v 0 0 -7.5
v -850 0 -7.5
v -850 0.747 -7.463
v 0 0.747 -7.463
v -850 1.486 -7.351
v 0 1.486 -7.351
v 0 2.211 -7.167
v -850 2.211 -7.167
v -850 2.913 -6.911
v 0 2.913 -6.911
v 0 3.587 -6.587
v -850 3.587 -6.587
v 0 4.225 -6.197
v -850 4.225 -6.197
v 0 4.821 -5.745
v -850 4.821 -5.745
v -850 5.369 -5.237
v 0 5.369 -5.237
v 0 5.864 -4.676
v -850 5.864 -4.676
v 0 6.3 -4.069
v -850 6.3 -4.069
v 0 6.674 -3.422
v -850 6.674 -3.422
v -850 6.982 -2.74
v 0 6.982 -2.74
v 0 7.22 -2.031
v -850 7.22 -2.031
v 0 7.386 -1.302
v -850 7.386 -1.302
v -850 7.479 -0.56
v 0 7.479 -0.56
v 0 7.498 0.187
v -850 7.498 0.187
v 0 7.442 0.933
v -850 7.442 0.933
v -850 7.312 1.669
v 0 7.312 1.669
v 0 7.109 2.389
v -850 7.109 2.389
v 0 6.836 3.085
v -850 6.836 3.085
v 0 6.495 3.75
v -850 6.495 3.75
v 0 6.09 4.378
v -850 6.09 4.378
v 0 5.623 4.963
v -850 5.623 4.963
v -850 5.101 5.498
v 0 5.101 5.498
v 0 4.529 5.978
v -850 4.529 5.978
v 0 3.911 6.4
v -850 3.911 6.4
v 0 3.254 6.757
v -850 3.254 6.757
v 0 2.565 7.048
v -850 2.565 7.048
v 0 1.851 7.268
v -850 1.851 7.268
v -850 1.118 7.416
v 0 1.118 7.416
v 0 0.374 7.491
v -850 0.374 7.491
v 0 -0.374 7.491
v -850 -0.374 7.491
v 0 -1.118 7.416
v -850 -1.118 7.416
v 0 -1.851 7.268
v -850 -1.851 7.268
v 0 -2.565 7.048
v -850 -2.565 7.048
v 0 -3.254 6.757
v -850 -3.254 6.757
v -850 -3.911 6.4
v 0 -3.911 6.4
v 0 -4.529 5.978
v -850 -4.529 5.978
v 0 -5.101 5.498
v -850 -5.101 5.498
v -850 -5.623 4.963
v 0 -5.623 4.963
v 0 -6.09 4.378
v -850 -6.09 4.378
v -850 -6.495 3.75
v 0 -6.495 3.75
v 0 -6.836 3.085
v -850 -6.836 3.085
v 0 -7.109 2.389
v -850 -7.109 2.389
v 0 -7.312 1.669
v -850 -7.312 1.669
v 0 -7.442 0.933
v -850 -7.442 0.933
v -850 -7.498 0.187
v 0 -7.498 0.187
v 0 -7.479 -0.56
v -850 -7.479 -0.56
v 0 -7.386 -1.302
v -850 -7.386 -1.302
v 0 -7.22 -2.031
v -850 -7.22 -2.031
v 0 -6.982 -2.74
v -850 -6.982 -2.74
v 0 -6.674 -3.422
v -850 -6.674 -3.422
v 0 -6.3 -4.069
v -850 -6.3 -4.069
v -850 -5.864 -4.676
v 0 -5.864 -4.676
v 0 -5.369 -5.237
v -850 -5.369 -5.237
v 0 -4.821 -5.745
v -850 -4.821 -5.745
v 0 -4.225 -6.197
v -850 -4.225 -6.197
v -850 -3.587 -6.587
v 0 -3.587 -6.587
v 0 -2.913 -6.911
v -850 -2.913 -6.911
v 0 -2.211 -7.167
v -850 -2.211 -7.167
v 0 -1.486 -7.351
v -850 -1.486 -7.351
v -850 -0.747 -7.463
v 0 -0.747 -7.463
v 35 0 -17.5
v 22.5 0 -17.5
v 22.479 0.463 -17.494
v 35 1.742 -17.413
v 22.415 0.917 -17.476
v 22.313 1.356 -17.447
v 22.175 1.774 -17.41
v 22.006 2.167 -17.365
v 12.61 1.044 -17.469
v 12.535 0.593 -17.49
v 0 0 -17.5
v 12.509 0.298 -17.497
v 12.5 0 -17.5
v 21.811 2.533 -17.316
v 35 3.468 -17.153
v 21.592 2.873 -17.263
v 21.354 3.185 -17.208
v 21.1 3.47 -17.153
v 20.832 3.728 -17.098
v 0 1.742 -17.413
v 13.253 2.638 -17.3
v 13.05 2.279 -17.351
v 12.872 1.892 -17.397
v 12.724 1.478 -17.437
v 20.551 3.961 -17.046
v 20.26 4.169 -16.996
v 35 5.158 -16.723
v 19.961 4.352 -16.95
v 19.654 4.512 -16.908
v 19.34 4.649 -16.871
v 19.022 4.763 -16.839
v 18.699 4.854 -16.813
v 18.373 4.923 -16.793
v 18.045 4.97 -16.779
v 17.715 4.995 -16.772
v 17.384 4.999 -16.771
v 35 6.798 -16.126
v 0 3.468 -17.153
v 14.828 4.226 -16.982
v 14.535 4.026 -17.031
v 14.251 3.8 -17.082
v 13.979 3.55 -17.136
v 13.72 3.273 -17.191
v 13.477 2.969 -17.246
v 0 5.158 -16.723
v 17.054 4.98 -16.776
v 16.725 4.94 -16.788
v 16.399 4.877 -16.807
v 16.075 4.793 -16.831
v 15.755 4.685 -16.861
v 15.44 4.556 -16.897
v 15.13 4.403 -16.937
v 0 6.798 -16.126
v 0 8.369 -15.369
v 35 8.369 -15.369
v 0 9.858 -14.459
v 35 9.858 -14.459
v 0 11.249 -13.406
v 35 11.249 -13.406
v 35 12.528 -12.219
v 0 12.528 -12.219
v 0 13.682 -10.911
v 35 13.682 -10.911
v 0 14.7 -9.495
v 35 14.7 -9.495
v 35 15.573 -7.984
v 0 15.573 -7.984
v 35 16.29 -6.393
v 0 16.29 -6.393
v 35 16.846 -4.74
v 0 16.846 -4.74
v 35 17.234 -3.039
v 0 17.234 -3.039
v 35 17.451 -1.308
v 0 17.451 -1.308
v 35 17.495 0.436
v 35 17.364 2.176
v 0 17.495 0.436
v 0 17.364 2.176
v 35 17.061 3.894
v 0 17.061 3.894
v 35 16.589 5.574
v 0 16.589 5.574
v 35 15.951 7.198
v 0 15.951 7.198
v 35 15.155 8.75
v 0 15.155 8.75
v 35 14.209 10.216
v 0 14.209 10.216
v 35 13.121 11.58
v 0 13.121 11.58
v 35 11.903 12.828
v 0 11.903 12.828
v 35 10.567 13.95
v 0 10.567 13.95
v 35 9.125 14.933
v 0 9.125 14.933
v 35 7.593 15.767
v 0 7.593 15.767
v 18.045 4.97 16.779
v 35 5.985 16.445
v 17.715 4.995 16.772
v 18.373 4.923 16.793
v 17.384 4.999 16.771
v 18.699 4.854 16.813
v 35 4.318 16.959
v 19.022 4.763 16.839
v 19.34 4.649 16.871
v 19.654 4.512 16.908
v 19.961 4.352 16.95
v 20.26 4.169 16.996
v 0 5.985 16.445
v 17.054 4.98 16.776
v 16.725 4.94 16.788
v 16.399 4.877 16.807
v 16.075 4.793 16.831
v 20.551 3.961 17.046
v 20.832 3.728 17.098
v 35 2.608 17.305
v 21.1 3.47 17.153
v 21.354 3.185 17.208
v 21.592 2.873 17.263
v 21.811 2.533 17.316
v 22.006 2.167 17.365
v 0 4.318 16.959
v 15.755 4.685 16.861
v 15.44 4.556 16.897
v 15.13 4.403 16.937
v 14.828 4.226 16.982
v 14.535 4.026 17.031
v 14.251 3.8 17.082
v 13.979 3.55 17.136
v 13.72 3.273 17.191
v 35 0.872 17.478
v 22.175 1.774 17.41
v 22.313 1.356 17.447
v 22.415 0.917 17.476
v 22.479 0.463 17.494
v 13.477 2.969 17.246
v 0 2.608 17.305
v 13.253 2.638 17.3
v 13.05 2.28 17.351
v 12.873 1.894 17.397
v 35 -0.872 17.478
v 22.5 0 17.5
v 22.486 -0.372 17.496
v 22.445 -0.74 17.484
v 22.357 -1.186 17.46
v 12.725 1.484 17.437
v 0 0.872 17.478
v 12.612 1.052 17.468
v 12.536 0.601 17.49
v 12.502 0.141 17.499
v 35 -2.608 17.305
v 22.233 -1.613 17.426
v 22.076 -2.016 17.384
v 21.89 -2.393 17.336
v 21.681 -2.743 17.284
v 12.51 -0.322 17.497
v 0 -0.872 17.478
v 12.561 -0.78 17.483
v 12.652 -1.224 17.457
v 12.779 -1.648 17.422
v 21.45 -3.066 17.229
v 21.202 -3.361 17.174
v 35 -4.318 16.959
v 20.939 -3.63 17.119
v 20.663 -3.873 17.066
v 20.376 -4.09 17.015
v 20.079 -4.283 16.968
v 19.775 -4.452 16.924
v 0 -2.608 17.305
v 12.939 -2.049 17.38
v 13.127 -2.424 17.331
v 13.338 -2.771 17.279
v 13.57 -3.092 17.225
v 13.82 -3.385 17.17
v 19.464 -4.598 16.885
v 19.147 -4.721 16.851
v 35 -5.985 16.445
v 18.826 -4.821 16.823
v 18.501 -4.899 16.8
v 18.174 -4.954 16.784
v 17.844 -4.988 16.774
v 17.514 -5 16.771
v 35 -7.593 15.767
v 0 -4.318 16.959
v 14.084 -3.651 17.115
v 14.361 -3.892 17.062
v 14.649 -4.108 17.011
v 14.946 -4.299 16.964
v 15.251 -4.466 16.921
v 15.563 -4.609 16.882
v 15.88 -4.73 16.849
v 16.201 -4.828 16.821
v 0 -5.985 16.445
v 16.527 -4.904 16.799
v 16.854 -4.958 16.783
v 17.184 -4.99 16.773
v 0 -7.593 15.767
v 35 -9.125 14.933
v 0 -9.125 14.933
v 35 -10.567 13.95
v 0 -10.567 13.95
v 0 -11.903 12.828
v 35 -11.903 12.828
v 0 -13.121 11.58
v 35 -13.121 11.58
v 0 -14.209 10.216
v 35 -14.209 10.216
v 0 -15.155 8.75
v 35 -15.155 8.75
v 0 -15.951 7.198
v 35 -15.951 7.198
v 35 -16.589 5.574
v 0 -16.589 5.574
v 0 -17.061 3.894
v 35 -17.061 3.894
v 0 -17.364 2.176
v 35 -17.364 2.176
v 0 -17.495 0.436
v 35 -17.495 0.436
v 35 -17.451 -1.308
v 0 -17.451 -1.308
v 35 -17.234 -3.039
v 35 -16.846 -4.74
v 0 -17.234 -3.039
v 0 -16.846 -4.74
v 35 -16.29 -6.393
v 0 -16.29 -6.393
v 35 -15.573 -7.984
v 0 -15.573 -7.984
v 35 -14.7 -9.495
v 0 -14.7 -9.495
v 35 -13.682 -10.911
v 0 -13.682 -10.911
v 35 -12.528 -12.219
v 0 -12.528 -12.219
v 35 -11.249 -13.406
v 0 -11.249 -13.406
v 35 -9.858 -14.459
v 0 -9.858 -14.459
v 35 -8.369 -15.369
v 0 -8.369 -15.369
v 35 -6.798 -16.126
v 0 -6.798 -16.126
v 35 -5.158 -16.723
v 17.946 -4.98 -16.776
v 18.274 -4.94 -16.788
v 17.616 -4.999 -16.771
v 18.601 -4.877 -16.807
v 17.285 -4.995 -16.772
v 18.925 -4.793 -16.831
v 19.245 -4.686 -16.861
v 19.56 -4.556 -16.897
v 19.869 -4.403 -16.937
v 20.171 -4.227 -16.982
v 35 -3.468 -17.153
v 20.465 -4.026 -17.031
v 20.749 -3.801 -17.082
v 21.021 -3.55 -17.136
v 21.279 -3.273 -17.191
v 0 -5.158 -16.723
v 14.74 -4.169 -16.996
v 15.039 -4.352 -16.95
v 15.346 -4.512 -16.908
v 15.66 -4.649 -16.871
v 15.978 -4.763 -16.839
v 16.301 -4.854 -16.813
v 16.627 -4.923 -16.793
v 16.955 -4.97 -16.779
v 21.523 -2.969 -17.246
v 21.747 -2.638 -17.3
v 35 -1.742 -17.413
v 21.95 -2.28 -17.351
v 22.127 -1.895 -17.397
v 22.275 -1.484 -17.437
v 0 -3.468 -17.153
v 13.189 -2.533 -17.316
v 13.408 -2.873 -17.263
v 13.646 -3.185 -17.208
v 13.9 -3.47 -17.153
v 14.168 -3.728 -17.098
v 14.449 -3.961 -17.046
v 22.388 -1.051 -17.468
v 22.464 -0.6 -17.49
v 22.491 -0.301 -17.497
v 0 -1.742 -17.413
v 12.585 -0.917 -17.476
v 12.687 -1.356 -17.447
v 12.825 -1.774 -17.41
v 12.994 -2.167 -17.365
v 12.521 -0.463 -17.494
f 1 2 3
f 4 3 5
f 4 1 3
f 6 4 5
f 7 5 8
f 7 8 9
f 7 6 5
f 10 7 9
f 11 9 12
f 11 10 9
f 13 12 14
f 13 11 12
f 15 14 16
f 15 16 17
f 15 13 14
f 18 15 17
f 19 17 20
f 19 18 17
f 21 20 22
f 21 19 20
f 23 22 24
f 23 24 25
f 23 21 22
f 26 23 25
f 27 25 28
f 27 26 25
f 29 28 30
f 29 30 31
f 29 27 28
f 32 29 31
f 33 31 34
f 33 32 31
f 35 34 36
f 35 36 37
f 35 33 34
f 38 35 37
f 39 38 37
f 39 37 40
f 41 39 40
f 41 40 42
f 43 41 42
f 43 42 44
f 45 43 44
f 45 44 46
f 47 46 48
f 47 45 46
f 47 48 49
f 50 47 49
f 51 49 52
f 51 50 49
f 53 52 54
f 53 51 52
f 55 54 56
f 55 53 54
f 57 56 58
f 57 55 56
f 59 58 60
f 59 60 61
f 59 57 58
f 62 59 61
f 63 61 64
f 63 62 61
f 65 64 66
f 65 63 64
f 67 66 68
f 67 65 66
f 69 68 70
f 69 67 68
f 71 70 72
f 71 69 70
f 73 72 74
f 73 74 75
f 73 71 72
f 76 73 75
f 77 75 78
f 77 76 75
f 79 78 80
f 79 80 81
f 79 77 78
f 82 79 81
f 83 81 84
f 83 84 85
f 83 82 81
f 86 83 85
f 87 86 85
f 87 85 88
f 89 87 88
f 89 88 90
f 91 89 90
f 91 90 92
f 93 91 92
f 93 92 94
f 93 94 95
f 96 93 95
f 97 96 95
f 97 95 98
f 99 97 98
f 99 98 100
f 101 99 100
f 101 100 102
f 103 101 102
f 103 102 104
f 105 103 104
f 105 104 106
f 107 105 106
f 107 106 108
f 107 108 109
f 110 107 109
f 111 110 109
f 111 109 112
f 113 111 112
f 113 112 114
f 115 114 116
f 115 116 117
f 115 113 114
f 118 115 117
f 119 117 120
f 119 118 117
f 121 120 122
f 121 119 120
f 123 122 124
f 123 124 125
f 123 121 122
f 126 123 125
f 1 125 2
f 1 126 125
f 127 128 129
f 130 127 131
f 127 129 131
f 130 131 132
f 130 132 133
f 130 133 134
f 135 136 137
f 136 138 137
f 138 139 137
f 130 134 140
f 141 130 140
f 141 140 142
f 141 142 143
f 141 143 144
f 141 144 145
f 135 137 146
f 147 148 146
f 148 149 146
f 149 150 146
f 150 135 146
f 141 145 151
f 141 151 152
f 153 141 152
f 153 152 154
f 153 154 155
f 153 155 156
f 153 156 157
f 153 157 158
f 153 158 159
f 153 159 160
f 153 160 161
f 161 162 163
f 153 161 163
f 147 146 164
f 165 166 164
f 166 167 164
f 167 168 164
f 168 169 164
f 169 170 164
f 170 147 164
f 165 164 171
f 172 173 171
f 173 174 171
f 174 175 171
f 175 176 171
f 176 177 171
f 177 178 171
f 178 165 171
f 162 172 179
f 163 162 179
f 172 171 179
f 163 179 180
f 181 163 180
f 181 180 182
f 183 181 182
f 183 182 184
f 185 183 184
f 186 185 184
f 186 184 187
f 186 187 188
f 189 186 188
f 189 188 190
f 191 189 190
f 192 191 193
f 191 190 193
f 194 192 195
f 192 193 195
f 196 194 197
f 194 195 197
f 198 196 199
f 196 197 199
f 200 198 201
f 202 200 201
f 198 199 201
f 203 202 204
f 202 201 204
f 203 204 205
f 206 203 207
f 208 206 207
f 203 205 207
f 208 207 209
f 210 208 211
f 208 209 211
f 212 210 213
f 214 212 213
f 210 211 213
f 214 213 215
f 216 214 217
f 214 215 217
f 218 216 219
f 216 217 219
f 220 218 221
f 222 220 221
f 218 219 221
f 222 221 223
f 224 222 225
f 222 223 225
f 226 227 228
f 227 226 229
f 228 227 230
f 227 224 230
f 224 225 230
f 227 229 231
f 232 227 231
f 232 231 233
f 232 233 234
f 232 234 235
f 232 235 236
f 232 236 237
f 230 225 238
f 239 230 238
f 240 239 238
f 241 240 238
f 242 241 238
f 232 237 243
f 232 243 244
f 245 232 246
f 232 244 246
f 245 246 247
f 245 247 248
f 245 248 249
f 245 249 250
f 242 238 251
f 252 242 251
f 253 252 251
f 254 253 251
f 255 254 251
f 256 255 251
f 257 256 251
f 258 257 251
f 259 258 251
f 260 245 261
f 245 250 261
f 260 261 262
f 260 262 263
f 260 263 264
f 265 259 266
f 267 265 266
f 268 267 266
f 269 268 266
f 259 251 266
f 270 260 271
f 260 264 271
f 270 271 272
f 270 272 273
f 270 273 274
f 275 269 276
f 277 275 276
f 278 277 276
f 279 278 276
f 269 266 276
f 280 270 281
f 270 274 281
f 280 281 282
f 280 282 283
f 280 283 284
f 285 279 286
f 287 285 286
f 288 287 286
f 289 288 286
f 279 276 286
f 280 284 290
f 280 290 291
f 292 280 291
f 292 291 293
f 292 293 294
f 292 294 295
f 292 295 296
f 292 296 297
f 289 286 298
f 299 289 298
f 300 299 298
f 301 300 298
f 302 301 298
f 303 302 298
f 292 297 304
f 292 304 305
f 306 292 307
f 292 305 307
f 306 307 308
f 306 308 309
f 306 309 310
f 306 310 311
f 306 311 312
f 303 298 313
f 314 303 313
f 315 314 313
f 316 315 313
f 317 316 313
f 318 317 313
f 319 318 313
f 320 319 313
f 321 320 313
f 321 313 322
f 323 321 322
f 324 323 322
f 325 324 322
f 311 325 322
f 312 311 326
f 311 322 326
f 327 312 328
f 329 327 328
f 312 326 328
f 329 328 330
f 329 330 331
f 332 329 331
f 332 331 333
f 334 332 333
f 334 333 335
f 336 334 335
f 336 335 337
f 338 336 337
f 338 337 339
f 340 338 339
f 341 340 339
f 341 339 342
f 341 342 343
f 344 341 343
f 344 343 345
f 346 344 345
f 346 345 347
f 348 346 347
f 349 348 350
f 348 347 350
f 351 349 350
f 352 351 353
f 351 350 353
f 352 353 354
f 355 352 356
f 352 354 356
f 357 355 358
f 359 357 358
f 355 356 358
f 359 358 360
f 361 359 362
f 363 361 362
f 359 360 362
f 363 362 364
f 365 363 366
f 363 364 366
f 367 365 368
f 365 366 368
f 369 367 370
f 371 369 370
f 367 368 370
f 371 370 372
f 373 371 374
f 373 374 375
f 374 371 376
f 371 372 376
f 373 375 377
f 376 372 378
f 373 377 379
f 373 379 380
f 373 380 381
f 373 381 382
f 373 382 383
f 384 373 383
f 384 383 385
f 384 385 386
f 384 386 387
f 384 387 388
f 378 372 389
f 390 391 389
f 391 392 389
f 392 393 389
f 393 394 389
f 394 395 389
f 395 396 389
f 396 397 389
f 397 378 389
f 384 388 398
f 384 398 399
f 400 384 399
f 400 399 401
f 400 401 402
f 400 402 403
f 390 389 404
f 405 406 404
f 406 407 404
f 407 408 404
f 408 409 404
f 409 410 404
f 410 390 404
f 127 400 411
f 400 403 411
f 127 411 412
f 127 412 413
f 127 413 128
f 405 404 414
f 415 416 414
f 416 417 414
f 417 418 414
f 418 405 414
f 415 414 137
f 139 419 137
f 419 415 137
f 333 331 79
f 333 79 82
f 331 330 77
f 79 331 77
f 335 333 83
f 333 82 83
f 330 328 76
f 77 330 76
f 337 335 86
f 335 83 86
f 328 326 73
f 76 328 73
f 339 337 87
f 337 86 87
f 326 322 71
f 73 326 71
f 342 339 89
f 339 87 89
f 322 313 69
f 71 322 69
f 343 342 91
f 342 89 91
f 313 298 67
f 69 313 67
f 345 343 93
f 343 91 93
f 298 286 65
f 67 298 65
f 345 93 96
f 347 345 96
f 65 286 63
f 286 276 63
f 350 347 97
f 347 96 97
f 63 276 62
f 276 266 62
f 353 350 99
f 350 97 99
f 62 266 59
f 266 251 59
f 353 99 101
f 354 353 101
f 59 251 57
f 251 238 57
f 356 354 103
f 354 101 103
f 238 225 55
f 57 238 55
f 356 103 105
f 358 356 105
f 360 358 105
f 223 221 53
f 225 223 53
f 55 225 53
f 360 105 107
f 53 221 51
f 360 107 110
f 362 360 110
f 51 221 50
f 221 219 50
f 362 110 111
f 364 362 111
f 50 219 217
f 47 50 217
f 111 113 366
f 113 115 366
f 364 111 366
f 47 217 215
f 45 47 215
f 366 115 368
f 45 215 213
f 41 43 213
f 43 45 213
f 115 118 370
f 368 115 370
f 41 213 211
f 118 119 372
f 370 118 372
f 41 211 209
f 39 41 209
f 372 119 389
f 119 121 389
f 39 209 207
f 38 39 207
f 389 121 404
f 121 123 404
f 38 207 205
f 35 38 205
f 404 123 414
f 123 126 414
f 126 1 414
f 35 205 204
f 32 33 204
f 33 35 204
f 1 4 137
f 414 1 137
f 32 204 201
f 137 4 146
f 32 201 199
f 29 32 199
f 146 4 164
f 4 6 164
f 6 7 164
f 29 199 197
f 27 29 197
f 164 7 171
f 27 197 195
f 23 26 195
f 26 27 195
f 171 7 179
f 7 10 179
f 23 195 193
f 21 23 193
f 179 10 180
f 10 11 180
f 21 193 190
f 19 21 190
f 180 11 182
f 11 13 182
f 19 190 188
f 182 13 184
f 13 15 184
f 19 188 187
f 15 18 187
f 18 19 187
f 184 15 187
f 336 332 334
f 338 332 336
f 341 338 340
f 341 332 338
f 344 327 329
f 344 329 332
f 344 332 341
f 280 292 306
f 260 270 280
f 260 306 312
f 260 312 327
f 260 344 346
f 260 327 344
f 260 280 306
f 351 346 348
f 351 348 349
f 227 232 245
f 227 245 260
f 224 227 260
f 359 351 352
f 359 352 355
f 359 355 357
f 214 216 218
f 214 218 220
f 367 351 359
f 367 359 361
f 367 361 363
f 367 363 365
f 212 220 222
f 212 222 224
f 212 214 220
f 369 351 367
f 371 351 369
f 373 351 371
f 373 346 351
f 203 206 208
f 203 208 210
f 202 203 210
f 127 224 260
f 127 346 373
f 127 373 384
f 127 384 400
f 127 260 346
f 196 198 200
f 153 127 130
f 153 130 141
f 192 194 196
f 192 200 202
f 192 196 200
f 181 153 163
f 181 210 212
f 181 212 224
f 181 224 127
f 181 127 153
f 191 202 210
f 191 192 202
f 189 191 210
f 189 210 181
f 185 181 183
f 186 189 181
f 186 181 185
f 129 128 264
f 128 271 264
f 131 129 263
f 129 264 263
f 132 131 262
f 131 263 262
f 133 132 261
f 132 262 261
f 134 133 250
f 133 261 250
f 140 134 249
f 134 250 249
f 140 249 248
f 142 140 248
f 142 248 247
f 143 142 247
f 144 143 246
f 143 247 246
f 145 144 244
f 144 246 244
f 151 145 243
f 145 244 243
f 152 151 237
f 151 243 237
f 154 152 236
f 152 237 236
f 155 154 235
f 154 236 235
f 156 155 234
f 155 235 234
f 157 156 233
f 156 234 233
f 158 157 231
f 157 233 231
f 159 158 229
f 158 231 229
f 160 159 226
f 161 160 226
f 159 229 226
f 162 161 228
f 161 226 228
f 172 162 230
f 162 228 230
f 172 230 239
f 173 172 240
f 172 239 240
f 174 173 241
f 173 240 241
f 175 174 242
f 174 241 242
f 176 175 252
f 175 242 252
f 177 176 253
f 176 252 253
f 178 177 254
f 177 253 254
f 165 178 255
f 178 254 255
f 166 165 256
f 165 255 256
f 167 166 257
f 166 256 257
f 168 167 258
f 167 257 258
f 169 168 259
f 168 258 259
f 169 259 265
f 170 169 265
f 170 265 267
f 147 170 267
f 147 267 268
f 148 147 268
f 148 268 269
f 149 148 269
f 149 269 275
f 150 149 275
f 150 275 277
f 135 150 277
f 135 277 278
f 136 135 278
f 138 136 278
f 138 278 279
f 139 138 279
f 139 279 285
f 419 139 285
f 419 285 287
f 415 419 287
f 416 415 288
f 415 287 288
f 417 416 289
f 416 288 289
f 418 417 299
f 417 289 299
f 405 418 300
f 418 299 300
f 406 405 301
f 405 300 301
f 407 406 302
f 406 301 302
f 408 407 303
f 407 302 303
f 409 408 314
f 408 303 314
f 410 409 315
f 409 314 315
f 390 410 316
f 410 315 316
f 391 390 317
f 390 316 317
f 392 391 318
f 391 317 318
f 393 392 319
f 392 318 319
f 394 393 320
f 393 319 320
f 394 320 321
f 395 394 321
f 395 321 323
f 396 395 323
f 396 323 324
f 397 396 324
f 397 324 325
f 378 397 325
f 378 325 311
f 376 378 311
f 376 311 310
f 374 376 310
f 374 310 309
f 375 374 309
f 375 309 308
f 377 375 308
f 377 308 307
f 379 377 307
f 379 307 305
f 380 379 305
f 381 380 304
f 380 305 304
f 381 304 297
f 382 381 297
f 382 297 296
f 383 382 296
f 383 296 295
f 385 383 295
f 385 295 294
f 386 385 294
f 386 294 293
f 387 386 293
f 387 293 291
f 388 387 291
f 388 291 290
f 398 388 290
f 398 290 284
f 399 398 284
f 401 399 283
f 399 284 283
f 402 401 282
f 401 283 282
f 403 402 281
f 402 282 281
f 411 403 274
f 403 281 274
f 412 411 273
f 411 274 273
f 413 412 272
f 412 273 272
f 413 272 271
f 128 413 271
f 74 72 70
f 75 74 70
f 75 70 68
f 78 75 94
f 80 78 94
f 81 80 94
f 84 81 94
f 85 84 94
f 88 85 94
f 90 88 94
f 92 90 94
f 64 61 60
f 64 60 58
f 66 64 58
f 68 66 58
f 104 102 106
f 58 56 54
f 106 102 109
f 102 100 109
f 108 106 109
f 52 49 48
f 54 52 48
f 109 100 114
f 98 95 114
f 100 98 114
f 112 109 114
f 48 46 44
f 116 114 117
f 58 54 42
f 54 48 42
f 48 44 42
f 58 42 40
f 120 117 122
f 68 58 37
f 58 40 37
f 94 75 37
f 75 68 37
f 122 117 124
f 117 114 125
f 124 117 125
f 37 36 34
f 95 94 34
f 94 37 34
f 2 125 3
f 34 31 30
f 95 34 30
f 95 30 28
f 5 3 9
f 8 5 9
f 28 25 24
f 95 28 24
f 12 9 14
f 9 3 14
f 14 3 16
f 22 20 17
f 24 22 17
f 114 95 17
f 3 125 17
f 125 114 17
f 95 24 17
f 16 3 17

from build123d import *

# Parameters (mm, degrees)
SKETCH1_R               = 7.5
BOSS_EXTRUDE1_DEPTH     = 850
SKETCH2_R               = 17.5
BOSS_EXTRUDE2_DEPTH     = 35
SKETCH3_R               = 5
CUT_EXTRUDE2_DEPTH      = 18.5
CUT_EXTRUDE2_DEPTH_BACK = 18.5


with BuildPart() as part:
    # Sketch1 → Boss-Extrude1 (new body)
    with BuildSketch(Plane(origin=(0, 0, 0), x_dir=(0, 0, -1), z_dir=(1, 0, 0))):
        Circle(SKETCH1_R)
    extrude(amount=-BOSS_EXTRUDE1_DEPTH)

    # Sketch2 → Boss-Extrude2 (add)
    with BuildSketch(Plane(origin=(0, 0, 0), x_dir=(0, 0, -1), z_dir=(1, 0, 0))):
        Circle(SKETCH2_R)
    extrude(amount=BOSS_EXTRUDE2_DEPTH)

    # Sketch3 → Cut-Extrude2 (cut, two sides)
    with BuildSketch(Plane.XY) as cut_extrude2_sk:
        with Locations((17.5, 0)):
            Circle(SKETCH3_R)
    extrude(amount=CUT_EXTRUDE2_DEPTH, mode=Mode.SUBTRACT)
    extrude(cut_extrude2_sk.sketch, amount=-CUT_EXTRUDE2_DEPTH_BACK, mode=Mode.SUBTRACT)


solid = part.part
